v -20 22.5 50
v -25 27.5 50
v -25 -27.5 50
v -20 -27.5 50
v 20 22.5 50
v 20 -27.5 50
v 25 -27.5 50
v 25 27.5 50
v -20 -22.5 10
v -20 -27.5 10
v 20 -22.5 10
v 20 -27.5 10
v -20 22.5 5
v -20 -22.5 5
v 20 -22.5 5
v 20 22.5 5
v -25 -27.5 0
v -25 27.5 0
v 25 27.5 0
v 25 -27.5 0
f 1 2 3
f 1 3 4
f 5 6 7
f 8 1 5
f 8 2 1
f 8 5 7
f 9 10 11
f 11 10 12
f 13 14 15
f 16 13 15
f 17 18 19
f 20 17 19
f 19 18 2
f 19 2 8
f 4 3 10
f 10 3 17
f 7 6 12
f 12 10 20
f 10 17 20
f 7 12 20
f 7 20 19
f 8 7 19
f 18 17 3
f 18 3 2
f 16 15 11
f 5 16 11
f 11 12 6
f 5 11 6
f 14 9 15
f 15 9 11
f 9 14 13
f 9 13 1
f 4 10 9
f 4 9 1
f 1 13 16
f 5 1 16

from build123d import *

# Parameters (mm, degrees)
F0_W     = 50
F0_H     = 55
F1_DEPTH = 50
F2_W     = 40
F2_H     = 45
F3_DEPTH = 45
F4_W     = 40
F4_H     = 40
F5_DEPTH = 5


with BuildPart() as f1:
    # F0 (on Top) → F1 (new body)
    with BuildSketch(Plane.XY):
        Rectangle(F0_W, F0_H)
    extrude(amount=F1_DEPTH)

    # F2 (on face) → F3 (cut)
    with BuildSketch(Plane.XY.offset(50)):
        Rectangle(F2_W, F2_H)
    extrude(amount=-F3_DEPTH, mode=Mode.SUBTRACT)

    # F4 (on face) → F5 (cut)
    with BuildSketch(Plane.XZ.offset(27.5)):
        with Locations((0, 30)):
            Rectangle(F4_W, F4_H)
    extrude(amount=-F5_DEPTH, mode=Mode.SUBTRACT)


solid = f1.part
